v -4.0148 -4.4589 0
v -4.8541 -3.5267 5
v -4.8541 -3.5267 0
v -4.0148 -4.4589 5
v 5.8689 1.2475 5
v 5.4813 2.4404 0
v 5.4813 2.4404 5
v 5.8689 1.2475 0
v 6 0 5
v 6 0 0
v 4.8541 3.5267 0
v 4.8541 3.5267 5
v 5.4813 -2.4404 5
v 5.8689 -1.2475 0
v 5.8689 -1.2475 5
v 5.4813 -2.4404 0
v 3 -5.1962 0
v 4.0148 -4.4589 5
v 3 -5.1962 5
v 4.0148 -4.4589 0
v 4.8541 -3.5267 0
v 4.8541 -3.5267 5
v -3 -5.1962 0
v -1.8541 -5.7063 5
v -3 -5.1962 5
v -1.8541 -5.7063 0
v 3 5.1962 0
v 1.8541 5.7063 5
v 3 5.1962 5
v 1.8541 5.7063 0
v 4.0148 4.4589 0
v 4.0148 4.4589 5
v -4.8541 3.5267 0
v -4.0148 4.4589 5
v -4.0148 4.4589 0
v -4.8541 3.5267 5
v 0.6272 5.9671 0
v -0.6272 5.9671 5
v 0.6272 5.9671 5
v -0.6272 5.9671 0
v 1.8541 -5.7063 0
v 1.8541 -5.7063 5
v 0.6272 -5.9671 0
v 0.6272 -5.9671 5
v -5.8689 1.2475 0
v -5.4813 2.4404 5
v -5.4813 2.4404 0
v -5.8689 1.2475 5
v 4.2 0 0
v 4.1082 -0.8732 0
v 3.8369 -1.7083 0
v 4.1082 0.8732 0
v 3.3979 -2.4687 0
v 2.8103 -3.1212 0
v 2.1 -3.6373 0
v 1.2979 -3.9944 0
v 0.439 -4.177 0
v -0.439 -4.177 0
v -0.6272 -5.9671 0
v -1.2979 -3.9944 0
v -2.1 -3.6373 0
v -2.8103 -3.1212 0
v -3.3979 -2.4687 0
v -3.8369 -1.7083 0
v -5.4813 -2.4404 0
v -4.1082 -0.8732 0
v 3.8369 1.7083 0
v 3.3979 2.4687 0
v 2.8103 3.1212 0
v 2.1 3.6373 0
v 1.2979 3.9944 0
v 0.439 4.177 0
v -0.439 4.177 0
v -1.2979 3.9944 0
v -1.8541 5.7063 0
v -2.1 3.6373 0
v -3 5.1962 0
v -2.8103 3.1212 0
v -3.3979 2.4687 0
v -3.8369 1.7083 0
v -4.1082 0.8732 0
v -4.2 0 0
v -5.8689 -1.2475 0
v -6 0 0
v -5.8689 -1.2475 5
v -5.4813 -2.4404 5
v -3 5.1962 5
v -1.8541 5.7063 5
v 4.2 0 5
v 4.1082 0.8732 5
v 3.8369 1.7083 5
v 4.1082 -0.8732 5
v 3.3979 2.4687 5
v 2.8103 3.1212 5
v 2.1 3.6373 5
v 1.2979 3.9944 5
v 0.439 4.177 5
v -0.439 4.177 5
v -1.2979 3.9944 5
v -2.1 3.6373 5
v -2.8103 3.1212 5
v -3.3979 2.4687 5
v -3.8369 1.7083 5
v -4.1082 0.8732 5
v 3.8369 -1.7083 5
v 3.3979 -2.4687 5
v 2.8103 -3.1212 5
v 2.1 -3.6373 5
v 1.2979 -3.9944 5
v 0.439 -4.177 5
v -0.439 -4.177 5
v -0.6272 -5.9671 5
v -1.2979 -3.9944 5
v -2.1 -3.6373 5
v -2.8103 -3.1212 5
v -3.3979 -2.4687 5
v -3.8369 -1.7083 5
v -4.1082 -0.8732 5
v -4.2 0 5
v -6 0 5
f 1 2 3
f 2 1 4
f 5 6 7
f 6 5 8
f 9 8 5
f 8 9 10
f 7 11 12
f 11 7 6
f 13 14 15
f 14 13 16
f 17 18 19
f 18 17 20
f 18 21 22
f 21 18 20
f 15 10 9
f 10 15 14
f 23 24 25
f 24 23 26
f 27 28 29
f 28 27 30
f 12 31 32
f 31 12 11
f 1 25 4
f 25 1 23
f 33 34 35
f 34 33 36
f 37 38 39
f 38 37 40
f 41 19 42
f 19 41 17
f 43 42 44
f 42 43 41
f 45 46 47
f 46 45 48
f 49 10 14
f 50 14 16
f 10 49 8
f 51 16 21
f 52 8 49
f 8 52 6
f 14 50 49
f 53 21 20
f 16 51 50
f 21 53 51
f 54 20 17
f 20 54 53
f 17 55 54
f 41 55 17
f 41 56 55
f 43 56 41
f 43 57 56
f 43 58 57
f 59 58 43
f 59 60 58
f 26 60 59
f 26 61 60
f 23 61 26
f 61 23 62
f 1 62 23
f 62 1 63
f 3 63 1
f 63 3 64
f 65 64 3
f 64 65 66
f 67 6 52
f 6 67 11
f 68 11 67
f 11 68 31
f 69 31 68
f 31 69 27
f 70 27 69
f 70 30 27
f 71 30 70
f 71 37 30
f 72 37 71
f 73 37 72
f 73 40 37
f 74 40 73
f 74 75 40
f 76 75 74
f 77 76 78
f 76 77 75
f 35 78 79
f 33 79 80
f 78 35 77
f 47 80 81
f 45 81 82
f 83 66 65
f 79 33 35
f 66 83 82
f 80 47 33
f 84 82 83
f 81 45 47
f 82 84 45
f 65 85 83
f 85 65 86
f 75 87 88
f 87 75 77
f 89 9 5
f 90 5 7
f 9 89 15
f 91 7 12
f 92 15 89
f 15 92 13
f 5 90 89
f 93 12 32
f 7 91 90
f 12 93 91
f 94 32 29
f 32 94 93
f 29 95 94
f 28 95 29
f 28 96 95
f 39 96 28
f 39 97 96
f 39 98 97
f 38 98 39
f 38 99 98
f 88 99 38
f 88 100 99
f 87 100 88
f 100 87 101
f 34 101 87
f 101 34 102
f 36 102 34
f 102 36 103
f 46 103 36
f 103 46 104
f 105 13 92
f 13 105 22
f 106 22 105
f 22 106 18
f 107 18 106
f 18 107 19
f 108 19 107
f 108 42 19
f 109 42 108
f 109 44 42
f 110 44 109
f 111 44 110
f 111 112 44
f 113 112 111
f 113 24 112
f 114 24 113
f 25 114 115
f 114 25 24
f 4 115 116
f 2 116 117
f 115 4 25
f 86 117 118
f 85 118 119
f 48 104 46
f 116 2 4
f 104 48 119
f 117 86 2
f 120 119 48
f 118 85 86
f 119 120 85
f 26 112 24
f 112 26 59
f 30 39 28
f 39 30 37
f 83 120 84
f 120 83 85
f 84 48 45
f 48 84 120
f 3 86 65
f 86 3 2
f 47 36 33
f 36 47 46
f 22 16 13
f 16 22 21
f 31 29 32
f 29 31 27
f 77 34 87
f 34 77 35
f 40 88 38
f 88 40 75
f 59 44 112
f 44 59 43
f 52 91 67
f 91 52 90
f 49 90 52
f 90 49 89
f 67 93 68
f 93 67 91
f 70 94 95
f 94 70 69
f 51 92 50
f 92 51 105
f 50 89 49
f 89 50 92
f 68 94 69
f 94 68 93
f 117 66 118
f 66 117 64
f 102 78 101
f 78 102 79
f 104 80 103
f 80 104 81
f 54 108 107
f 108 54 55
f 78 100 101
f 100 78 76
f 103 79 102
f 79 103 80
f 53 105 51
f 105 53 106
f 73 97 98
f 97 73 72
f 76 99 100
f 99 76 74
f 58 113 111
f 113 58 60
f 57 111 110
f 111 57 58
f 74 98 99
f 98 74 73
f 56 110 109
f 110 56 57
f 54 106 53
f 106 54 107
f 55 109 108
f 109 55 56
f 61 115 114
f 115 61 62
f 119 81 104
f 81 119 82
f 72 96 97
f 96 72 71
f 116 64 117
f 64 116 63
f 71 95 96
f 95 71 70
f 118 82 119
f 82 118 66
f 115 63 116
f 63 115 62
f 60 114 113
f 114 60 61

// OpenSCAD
difference(){
translate([0,0,0])cylinder(r=12/2,h=5,$fn=30);
translate([0,0,-1])cylinder(r=8.4/2,h=22,$fn=30);
}
